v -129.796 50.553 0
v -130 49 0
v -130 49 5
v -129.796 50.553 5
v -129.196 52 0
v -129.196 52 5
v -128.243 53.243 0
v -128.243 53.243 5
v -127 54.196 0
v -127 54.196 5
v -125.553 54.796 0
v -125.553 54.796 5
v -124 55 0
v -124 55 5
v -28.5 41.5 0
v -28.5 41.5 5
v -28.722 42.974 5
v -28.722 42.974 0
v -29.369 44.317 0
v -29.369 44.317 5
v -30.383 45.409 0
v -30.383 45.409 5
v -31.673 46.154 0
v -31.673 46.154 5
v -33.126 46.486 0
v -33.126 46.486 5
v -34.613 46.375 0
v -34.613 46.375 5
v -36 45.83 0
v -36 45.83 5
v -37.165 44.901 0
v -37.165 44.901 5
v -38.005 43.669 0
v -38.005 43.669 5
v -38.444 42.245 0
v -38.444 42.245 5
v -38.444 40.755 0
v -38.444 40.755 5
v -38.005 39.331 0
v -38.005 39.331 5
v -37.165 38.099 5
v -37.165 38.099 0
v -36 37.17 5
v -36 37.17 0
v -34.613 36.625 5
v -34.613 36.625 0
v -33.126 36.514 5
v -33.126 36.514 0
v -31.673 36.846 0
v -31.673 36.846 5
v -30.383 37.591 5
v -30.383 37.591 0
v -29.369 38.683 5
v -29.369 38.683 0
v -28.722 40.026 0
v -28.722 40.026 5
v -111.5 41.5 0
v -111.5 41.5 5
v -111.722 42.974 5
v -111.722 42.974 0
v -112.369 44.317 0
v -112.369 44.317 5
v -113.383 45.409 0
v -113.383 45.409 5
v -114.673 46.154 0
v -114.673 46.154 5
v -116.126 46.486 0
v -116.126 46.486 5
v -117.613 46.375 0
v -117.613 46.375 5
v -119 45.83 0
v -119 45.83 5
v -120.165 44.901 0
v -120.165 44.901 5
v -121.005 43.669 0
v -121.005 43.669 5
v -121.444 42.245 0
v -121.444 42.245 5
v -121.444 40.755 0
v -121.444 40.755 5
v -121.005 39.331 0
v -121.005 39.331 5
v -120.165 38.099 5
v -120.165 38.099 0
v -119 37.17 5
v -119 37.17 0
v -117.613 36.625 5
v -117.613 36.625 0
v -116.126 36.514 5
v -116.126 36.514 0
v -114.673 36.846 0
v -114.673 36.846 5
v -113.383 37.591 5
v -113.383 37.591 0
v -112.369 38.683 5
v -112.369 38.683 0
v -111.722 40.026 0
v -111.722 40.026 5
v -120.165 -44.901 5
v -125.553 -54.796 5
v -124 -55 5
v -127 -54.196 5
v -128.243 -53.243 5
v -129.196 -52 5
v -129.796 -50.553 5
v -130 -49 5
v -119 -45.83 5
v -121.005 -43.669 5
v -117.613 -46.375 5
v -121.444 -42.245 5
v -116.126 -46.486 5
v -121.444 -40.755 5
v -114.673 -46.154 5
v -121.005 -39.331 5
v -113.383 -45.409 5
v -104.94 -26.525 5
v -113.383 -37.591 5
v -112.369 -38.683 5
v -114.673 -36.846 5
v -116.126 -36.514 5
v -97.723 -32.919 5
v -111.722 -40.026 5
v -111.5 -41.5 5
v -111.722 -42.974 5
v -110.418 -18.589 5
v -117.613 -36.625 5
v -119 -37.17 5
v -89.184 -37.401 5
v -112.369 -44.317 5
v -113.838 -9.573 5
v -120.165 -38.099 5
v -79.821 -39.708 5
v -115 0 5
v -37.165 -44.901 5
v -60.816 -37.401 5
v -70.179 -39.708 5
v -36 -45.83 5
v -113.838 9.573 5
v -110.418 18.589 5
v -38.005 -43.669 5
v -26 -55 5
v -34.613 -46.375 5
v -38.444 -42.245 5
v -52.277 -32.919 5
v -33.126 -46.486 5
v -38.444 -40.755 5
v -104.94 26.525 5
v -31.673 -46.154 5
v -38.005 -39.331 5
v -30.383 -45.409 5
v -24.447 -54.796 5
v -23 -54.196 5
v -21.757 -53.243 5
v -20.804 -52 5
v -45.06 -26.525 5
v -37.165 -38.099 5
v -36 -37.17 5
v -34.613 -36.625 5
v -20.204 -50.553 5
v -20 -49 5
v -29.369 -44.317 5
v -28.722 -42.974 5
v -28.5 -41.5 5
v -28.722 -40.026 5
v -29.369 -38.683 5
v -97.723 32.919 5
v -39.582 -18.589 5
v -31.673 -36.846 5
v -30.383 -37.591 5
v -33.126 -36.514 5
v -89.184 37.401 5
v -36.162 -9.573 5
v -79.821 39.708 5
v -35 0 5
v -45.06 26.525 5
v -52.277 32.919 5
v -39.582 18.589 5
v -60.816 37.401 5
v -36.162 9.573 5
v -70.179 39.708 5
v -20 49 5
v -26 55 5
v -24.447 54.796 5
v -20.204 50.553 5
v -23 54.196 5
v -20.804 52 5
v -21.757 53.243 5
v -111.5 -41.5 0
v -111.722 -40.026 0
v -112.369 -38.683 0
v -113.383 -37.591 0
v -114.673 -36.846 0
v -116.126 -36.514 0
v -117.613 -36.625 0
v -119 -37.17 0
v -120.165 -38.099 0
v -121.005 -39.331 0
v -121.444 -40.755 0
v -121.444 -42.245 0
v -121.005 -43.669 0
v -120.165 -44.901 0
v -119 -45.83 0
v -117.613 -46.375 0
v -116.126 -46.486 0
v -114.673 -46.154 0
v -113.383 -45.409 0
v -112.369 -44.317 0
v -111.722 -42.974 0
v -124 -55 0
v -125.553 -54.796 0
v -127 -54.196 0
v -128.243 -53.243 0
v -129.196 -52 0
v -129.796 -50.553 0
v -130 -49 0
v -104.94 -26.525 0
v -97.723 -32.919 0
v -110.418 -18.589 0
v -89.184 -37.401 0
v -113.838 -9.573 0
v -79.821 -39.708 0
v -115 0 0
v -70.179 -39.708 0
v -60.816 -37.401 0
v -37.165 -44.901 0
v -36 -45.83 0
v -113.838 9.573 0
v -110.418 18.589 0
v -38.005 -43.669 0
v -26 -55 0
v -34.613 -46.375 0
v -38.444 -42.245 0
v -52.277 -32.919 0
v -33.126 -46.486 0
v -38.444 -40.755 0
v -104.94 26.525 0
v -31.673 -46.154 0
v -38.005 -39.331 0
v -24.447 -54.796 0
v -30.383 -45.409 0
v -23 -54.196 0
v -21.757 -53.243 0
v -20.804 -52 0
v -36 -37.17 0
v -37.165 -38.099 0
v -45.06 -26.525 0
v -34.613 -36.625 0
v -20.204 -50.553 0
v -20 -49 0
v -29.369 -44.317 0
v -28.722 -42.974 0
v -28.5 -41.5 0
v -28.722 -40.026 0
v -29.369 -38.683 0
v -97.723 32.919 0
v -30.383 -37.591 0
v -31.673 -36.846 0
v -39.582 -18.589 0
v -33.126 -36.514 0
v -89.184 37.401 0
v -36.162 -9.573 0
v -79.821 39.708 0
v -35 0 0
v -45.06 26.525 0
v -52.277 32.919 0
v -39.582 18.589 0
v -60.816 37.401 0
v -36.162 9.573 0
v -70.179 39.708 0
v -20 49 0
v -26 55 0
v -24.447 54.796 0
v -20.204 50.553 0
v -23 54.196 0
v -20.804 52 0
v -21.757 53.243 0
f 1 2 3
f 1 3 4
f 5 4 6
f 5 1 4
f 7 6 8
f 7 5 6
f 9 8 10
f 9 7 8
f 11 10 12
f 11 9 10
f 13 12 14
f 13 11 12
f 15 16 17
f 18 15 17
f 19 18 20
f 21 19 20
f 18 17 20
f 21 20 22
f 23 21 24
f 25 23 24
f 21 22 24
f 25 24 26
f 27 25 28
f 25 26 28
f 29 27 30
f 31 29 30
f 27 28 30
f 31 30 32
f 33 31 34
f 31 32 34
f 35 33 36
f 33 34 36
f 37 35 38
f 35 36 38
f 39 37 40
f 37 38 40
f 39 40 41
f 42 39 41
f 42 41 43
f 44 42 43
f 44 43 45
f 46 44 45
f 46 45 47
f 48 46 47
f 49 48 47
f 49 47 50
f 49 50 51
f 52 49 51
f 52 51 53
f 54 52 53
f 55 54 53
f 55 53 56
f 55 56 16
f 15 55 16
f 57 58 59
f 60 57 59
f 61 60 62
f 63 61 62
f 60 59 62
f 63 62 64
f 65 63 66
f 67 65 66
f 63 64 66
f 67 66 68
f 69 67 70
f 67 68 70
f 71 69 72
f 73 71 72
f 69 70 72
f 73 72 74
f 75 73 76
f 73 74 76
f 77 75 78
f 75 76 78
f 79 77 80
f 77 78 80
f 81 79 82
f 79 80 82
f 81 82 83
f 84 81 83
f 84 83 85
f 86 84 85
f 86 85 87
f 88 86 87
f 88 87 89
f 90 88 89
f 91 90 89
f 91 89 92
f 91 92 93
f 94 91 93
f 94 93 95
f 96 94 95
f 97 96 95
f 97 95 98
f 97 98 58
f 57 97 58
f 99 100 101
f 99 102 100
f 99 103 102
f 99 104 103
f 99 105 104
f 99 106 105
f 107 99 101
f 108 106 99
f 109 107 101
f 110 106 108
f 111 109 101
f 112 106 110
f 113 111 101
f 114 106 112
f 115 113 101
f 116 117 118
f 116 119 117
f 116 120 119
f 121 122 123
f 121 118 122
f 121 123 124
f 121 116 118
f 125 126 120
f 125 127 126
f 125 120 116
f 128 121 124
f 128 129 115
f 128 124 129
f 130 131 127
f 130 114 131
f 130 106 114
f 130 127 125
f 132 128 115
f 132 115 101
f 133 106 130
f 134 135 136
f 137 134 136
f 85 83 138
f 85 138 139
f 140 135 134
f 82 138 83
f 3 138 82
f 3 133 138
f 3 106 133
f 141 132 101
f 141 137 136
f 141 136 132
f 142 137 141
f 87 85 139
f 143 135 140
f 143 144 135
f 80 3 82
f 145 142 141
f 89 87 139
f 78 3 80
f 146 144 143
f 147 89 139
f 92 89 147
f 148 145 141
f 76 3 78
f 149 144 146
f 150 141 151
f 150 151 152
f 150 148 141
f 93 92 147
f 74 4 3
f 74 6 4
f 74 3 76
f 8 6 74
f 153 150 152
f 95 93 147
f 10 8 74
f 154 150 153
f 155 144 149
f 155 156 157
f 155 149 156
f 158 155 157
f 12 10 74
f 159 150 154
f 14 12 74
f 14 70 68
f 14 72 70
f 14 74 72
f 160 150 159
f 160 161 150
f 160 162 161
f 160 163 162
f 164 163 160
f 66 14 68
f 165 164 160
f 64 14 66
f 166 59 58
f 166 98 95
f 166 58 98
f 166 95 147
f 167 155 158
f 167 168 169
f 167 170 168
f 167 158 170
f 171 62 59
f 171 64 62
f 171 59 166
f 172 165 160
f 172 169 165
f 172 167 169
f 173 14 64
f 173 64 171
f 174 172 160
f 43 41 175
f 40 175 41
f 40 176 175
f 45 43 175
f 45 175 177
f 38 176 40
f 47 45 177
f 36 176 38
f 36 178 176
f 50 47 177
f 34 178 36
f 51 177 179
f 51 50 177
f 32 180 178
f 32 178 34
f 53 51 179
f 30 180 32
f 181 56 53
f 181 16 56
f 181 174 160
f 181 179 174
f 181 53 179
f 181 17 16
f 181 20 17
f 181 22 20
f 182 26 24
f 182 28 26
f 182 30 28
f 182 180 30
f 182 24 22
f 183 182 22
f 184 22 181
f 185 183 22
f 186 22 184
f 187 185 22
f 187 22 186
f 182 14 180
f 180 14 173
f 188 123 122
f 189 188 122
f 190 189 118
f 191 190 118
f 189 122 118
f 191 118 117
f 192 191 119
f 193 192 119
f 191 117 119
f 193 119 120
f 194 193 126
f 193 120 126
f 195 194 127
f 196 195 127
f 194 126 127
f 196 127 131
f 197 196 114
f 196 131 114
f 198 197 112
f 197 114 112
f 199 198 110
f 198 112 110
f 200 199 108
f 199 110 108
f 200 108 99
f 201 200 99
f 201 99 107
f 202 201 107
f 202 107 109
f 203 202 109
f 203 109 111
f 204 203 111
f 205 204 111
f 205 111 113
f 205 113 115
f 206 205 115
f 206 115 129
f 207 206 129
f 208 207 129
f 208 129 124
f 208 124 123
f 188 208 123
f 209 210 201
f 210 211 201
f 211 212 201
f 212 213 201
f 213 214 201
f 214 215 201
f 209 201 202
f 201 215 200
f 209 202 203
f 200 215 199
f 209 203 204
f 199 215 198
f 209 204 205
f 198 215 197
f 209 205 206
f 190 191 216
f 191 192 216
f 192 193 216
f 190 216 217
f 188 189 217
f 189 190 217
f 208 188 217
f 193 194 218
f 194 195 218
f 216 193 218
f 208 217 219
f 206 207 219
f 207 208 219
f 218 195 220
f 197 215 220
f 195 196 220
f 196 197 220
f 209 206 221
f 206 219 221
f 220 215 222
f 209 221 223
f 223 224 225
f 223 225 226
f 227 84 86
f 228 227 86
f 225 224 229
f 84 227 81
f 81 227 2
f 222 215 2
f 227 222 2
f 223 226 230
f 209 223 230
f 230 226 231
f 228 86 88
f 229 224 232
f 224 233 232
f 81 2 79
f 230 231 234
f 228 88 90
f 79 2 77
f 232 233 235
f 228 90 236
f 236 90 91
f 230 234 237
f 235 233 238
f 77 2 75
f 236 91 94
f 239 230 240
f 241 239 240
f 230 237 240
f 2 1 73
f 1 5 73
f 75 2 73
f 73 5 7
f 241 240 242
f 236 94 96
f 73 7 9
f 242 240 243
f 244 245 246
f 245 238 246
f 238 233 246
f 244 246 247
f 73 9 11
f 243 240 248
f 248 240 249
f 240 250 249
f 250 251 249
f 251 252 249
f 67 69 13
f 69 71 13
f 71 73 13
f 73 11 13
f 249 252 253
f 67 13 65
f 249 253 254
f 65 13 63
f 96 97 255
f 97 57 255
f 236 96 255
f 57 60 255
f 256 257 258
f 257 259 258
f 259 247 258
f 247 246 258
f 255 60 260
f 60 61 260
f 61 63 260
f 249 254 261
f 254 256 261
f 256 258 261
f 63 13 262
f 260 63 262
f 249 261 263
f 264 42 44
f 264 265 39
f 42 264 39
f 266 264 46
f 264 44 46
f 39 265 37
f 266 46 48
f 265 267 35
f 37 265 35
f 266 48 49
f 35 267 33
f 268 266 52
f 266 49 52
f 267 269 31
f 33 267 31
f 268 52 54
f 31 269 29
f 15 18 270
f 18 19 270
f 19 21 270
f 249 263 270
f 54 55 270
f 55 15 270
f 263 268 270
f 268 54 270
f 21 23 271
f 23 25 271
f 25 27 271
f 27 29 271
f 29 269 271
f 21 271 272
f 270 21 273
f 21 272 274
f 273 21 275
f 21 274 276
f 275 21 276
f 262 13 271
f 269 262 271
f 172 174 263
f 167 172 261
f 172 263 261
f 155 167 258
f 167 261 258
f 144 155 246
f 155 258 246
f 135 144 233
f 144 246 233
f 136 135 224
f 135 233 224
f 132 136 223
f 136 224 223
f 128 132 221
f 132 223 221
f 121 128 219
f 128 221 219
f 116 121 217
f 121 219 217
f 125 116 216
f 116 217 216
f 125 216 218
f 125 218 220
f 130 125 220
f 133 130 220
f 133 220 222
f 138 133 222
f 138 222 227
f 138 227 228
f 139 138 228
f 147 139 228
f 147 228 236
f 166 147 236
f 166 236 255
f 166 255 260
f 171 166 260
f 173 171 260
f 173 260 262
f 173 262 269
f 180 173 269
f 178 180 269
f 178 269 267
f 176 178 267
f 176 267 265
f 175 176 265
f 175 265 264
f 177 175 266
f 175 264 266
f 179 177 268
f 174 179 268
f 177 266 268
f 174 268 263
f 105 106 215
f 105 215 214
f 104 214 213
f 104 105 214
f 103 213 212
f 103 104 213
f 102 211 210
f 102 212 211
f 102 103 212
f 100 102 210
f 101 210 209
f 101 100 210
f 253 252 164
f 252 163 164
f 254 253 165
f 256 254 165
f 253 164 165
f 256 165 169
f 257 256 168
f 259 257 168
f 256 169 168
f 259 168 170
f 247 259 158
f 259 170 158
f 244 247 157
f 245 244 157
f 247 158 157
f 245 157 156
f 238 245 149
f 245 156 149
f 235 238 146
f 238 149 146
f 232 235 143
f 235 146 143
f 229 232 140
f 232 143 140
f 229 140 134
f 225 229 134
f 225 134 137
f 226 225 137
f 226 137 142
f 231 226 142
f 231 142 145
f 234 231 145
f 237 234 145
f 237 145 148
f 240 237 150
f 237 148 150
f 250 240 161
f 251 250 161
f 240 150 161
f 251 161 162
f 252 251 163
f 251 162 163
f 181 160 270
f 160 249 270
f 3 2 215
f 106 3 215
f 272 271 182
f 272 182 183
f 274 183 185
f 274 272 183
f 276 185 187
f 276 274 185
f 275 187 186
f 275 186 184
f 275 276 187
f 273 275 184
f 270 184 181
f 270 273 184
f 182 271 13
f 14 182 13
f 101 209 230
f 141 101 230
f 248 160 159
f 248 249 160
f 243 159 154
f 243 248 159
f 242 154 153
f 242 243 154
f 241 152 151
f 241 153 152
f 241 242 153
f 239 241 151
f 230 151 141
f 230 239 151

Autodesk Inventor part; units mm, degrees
ref_plane "YZ Plane" through (0, 0, 0) normal (1, 0, 0) x (0, 1, 0)
ref_plane "XZ Plane" through (0, 0, 0) normal (0, 1, 0) x (-1, 0, 0)
ref_plane "XY Plane" through (0, 0, 0) normal (0, 0, 1) x (1, 0, 0)
sketch "Sketch1" plane through (0, 0, 0) normal (0, 0, 1) x (1, 0, 0)
  line L0 (-200, 100) -> (200, 100)
  line L1 (200, 100) -> (200, -100)
  line L2 (200, -100) -> (-200, -100)
  line L3 (-200, -100) -> (-200, 100)
  line L4 (-200, 100) -> (200, -100) construction
  line L5 (200, 100) -> (-200, -100) construction
  point P0 (0, 0)
  point P1 (0, 0)
  point P2 (0, 0)
  dimension "d25" = 400
  dimension "d26" = 200
extrude "Plate1" add sketch "Sketch1" along normal blind 5
sketch "Sketch5" plane through (-195, -100, 0) normal (-1, 0, 0) x (0, -1, 0)
  line L0 (-200, 0) -> (0, 0)
  line L1 (0, 0) -> (0, 50)
  line L2 (0, 50) -> (-200, 50)
  line L3 (-200, 50) -> (-200, 0)
edge flange "Flange2" height 50 angle 90 thickness 5 bend radius 5 thickness toward (-1, 0, 0) relief round relief width 5 relief depth 2.5 corner gap 5 corner form 0 edges at (-200, 0, 5) (200, 0, 5) (0, 100, 5) (0, -100, 5) wall of the first edge with corners at (-195, 100, 0) (-195, -100, 0) (-195, -100, 50) (-195, 100, 50)
bend "Bend2"
corner "Corner2"
sketch "Sketch6" plane through (0, 0, 5) normal (0, 0, 1) x (1, 0, 0)
  circle A0 centre (-75, 0) radius 16
  circle A1 centre (75, 0) radius 16
  line L0 (0, 0) -> (0, 55.0725) construction
  circle A2 centre (33.5, 41.5) radius 5
  circle A3 centre (116.5, 41.5) radius 5
  circle A4 centre (116.5, -41.5) radius 5
  circle A5 centre (33.5, -41.5) radius 5
  line L1 (75, 0) -> (-75, 0)
  line L2 (75, 0) -> (75, -40.8866)
  circle A6 centre (-33.5, 41.5) radius 5
  circle A7 centre (-116.5, 41.5) radius 5
  circle A8 centre (-116.5, -41.5) radius 5
  circle A9 centre (-33.5, -41.5) radius 5
  point P0 (-75, -40.8866)
  dimension "d37" = 32
  dimension "d38" = 150
  dimension "d55" = 10
  dimension "d56" = 83
  dimension "d57" = 83
extrude "Cut1" cut sketch "Sketch6" against normal blind 5
sketch "Sketch7" plane through (-194.2929, 100, 10) normal (0, 1, 0) x (1, 0, 0)
  circle A0 centre (194.2929, -20) radius 6.5
  line L0 (5, 5) -> (383.5858, 5) projected
  line L1 (383.5858, 5) -> (384.2929, 5) projected
  line L2 (384.2929, 5) -> (383.5858, 5) projected
  line L3 (383.5858, 5) -> (5, 5) projected
  line L4 (5, 5) -> (4.2929, 5) projected
  line L5 (4.2929, 5) -> (5, 5) projected
  point P0 (194.2929, 10)
  dimension "d41" = 13
  dimension "d42" = 25
extrude "Extrusion2" cut sketch "Sketch7" against normal through all
pattern_linear "Rectangular Pattern1" count 3 spacing 160 along (-1, 0, 0) of "Extrusion2" first direction both ways yes
sketch "Sketch8" plane through (0, 0, 0) normal (1, 0, 0) x (0, 1, 0)
  line L0 (-94.2929, 50) -> (94.2929, 50) projected
  circle A0 centre (0, 30) radius 6.5
  line L1 (89.2929, 5) -> (-89.2929, 5) projected
  point P0 (0, 0)
  dimension "d48" = 13
  dimension "d49" = 25
extrude "Extrusion3" cut sketch "Sketch8" along normal through all both and the other way through all
pattern_linear "Rectangular Pattern2" count 3 spacing 70 along (0, 1, 0) of "Extrusion3" first direction both ways yes
sketch "Sketch9" plane through (0, 0, 0) normal (0, 0, 1) x (1, 0, 0)
  line L0 (-233.1694, -164.5287) -> (298.5547, -164.5287)
  line L1 (298.5547, -164.5287) -> (298.5547, 258.31)
  line L2 (298.5547, 258.31) -> (-233.1694, 258.31)
  line L3 (-233.1694, 258.31) -> (-233.1694, -164.5287)
  circle A0 centre (-75, 0) radius 16 projected
  line L4 (-130, -55) -> (-20, -55)
  line L5 (-20, -55) -> (-20, 55)
  line L6 (-20, 55) -> (-130, 55)
  line L7 (-130, 55) -> (-130, -55)
  line L8 (-130, -55) -> (-20, 55) construction
  line L9 (-20, -55) -> (-130, 55) construction
  circle A1 centre (-75, 0) radius 40
  point P0 (0, 0)
  dimension "d58" = 110
  dimension "d59" = 110
  dimension "d60" = 80
extrude "Extrusion4" cut sketch "Sketch9" along normal through all both and the other way through all
fillet "Corner Round1" radius 6 4 edges at (-130, -55, 2.5) (-130, 55, 2.5) (-20, 55, 2.5) (-20, -55, 2.5)
equation "\"d25\" = Гриндер_проходная_ширина + 2 * Гриндер_размер_фланца"
equation "\"d26\" = Гриндер_высота"
equation "\"d38\" = Гриндер_Валы_между_центрами"
equation "\"d57\" = d56"
equation "\"d39\" = Thickness"
equation "\"d41\" = Гриндер_диам_отврс_корпуса"
equation "\"d42\" = Гриндер_отступ_отврс_корпуса"
equation "\"d48\" = Гриндер_диам_отврс_корпуса"
equation "\"d49\" = Гриндер_отступ_отврс_корпуса"
equation "\"d2\" = Thickness"
equation "\"d27\" = BendReliefWidth"
equation "\"d28\" = BendReliefDepth"
equation "\"d29\" = MinimumRemnant"
equation "\"d30\" = TransitionRadius"
equation "\"d33\" = BendRadius"
equation "\"d34\" = CornerReliefSize"
equation "\"d36\" = JacobiRadiusSize"
equation "\"BendReliefWidth\" = Thickness"
equation "\"BendReliefDepth\" = 0.5 * Thickness"
equation "\"TransitionRadius\" = BendRadius"
equation "\"JacobiRadiusSize\" = BendRadius"
equation "\"GapSize\" = Thickness"
equation "\"Гриндер_отступ_отврс_корпуса\" = 25"
equation "\"Гриндер_диам_отврс_корпуса\" = 13"
equation "\"Гриндер_проходная_ширина\" = 320"
equation "\"Гриндер_проходная_длина\" = 320"
equation "\"Гриндер_высота\" = 200"
equation "\"Гриндер_размер_фланца\" = 40"
equation "\"Гриндер_Валы_между_центрами\" = 150"
equation "\"Thickness\" = 5"
equation "\"MinimumRemnant\" = 10"
equation "\"BendRadius\" = 5"
equation "\"CornerReliefSize\" = 20"
properties part number "NDM-VOS 162 harrow plate 5" material "Stainless Steel"
